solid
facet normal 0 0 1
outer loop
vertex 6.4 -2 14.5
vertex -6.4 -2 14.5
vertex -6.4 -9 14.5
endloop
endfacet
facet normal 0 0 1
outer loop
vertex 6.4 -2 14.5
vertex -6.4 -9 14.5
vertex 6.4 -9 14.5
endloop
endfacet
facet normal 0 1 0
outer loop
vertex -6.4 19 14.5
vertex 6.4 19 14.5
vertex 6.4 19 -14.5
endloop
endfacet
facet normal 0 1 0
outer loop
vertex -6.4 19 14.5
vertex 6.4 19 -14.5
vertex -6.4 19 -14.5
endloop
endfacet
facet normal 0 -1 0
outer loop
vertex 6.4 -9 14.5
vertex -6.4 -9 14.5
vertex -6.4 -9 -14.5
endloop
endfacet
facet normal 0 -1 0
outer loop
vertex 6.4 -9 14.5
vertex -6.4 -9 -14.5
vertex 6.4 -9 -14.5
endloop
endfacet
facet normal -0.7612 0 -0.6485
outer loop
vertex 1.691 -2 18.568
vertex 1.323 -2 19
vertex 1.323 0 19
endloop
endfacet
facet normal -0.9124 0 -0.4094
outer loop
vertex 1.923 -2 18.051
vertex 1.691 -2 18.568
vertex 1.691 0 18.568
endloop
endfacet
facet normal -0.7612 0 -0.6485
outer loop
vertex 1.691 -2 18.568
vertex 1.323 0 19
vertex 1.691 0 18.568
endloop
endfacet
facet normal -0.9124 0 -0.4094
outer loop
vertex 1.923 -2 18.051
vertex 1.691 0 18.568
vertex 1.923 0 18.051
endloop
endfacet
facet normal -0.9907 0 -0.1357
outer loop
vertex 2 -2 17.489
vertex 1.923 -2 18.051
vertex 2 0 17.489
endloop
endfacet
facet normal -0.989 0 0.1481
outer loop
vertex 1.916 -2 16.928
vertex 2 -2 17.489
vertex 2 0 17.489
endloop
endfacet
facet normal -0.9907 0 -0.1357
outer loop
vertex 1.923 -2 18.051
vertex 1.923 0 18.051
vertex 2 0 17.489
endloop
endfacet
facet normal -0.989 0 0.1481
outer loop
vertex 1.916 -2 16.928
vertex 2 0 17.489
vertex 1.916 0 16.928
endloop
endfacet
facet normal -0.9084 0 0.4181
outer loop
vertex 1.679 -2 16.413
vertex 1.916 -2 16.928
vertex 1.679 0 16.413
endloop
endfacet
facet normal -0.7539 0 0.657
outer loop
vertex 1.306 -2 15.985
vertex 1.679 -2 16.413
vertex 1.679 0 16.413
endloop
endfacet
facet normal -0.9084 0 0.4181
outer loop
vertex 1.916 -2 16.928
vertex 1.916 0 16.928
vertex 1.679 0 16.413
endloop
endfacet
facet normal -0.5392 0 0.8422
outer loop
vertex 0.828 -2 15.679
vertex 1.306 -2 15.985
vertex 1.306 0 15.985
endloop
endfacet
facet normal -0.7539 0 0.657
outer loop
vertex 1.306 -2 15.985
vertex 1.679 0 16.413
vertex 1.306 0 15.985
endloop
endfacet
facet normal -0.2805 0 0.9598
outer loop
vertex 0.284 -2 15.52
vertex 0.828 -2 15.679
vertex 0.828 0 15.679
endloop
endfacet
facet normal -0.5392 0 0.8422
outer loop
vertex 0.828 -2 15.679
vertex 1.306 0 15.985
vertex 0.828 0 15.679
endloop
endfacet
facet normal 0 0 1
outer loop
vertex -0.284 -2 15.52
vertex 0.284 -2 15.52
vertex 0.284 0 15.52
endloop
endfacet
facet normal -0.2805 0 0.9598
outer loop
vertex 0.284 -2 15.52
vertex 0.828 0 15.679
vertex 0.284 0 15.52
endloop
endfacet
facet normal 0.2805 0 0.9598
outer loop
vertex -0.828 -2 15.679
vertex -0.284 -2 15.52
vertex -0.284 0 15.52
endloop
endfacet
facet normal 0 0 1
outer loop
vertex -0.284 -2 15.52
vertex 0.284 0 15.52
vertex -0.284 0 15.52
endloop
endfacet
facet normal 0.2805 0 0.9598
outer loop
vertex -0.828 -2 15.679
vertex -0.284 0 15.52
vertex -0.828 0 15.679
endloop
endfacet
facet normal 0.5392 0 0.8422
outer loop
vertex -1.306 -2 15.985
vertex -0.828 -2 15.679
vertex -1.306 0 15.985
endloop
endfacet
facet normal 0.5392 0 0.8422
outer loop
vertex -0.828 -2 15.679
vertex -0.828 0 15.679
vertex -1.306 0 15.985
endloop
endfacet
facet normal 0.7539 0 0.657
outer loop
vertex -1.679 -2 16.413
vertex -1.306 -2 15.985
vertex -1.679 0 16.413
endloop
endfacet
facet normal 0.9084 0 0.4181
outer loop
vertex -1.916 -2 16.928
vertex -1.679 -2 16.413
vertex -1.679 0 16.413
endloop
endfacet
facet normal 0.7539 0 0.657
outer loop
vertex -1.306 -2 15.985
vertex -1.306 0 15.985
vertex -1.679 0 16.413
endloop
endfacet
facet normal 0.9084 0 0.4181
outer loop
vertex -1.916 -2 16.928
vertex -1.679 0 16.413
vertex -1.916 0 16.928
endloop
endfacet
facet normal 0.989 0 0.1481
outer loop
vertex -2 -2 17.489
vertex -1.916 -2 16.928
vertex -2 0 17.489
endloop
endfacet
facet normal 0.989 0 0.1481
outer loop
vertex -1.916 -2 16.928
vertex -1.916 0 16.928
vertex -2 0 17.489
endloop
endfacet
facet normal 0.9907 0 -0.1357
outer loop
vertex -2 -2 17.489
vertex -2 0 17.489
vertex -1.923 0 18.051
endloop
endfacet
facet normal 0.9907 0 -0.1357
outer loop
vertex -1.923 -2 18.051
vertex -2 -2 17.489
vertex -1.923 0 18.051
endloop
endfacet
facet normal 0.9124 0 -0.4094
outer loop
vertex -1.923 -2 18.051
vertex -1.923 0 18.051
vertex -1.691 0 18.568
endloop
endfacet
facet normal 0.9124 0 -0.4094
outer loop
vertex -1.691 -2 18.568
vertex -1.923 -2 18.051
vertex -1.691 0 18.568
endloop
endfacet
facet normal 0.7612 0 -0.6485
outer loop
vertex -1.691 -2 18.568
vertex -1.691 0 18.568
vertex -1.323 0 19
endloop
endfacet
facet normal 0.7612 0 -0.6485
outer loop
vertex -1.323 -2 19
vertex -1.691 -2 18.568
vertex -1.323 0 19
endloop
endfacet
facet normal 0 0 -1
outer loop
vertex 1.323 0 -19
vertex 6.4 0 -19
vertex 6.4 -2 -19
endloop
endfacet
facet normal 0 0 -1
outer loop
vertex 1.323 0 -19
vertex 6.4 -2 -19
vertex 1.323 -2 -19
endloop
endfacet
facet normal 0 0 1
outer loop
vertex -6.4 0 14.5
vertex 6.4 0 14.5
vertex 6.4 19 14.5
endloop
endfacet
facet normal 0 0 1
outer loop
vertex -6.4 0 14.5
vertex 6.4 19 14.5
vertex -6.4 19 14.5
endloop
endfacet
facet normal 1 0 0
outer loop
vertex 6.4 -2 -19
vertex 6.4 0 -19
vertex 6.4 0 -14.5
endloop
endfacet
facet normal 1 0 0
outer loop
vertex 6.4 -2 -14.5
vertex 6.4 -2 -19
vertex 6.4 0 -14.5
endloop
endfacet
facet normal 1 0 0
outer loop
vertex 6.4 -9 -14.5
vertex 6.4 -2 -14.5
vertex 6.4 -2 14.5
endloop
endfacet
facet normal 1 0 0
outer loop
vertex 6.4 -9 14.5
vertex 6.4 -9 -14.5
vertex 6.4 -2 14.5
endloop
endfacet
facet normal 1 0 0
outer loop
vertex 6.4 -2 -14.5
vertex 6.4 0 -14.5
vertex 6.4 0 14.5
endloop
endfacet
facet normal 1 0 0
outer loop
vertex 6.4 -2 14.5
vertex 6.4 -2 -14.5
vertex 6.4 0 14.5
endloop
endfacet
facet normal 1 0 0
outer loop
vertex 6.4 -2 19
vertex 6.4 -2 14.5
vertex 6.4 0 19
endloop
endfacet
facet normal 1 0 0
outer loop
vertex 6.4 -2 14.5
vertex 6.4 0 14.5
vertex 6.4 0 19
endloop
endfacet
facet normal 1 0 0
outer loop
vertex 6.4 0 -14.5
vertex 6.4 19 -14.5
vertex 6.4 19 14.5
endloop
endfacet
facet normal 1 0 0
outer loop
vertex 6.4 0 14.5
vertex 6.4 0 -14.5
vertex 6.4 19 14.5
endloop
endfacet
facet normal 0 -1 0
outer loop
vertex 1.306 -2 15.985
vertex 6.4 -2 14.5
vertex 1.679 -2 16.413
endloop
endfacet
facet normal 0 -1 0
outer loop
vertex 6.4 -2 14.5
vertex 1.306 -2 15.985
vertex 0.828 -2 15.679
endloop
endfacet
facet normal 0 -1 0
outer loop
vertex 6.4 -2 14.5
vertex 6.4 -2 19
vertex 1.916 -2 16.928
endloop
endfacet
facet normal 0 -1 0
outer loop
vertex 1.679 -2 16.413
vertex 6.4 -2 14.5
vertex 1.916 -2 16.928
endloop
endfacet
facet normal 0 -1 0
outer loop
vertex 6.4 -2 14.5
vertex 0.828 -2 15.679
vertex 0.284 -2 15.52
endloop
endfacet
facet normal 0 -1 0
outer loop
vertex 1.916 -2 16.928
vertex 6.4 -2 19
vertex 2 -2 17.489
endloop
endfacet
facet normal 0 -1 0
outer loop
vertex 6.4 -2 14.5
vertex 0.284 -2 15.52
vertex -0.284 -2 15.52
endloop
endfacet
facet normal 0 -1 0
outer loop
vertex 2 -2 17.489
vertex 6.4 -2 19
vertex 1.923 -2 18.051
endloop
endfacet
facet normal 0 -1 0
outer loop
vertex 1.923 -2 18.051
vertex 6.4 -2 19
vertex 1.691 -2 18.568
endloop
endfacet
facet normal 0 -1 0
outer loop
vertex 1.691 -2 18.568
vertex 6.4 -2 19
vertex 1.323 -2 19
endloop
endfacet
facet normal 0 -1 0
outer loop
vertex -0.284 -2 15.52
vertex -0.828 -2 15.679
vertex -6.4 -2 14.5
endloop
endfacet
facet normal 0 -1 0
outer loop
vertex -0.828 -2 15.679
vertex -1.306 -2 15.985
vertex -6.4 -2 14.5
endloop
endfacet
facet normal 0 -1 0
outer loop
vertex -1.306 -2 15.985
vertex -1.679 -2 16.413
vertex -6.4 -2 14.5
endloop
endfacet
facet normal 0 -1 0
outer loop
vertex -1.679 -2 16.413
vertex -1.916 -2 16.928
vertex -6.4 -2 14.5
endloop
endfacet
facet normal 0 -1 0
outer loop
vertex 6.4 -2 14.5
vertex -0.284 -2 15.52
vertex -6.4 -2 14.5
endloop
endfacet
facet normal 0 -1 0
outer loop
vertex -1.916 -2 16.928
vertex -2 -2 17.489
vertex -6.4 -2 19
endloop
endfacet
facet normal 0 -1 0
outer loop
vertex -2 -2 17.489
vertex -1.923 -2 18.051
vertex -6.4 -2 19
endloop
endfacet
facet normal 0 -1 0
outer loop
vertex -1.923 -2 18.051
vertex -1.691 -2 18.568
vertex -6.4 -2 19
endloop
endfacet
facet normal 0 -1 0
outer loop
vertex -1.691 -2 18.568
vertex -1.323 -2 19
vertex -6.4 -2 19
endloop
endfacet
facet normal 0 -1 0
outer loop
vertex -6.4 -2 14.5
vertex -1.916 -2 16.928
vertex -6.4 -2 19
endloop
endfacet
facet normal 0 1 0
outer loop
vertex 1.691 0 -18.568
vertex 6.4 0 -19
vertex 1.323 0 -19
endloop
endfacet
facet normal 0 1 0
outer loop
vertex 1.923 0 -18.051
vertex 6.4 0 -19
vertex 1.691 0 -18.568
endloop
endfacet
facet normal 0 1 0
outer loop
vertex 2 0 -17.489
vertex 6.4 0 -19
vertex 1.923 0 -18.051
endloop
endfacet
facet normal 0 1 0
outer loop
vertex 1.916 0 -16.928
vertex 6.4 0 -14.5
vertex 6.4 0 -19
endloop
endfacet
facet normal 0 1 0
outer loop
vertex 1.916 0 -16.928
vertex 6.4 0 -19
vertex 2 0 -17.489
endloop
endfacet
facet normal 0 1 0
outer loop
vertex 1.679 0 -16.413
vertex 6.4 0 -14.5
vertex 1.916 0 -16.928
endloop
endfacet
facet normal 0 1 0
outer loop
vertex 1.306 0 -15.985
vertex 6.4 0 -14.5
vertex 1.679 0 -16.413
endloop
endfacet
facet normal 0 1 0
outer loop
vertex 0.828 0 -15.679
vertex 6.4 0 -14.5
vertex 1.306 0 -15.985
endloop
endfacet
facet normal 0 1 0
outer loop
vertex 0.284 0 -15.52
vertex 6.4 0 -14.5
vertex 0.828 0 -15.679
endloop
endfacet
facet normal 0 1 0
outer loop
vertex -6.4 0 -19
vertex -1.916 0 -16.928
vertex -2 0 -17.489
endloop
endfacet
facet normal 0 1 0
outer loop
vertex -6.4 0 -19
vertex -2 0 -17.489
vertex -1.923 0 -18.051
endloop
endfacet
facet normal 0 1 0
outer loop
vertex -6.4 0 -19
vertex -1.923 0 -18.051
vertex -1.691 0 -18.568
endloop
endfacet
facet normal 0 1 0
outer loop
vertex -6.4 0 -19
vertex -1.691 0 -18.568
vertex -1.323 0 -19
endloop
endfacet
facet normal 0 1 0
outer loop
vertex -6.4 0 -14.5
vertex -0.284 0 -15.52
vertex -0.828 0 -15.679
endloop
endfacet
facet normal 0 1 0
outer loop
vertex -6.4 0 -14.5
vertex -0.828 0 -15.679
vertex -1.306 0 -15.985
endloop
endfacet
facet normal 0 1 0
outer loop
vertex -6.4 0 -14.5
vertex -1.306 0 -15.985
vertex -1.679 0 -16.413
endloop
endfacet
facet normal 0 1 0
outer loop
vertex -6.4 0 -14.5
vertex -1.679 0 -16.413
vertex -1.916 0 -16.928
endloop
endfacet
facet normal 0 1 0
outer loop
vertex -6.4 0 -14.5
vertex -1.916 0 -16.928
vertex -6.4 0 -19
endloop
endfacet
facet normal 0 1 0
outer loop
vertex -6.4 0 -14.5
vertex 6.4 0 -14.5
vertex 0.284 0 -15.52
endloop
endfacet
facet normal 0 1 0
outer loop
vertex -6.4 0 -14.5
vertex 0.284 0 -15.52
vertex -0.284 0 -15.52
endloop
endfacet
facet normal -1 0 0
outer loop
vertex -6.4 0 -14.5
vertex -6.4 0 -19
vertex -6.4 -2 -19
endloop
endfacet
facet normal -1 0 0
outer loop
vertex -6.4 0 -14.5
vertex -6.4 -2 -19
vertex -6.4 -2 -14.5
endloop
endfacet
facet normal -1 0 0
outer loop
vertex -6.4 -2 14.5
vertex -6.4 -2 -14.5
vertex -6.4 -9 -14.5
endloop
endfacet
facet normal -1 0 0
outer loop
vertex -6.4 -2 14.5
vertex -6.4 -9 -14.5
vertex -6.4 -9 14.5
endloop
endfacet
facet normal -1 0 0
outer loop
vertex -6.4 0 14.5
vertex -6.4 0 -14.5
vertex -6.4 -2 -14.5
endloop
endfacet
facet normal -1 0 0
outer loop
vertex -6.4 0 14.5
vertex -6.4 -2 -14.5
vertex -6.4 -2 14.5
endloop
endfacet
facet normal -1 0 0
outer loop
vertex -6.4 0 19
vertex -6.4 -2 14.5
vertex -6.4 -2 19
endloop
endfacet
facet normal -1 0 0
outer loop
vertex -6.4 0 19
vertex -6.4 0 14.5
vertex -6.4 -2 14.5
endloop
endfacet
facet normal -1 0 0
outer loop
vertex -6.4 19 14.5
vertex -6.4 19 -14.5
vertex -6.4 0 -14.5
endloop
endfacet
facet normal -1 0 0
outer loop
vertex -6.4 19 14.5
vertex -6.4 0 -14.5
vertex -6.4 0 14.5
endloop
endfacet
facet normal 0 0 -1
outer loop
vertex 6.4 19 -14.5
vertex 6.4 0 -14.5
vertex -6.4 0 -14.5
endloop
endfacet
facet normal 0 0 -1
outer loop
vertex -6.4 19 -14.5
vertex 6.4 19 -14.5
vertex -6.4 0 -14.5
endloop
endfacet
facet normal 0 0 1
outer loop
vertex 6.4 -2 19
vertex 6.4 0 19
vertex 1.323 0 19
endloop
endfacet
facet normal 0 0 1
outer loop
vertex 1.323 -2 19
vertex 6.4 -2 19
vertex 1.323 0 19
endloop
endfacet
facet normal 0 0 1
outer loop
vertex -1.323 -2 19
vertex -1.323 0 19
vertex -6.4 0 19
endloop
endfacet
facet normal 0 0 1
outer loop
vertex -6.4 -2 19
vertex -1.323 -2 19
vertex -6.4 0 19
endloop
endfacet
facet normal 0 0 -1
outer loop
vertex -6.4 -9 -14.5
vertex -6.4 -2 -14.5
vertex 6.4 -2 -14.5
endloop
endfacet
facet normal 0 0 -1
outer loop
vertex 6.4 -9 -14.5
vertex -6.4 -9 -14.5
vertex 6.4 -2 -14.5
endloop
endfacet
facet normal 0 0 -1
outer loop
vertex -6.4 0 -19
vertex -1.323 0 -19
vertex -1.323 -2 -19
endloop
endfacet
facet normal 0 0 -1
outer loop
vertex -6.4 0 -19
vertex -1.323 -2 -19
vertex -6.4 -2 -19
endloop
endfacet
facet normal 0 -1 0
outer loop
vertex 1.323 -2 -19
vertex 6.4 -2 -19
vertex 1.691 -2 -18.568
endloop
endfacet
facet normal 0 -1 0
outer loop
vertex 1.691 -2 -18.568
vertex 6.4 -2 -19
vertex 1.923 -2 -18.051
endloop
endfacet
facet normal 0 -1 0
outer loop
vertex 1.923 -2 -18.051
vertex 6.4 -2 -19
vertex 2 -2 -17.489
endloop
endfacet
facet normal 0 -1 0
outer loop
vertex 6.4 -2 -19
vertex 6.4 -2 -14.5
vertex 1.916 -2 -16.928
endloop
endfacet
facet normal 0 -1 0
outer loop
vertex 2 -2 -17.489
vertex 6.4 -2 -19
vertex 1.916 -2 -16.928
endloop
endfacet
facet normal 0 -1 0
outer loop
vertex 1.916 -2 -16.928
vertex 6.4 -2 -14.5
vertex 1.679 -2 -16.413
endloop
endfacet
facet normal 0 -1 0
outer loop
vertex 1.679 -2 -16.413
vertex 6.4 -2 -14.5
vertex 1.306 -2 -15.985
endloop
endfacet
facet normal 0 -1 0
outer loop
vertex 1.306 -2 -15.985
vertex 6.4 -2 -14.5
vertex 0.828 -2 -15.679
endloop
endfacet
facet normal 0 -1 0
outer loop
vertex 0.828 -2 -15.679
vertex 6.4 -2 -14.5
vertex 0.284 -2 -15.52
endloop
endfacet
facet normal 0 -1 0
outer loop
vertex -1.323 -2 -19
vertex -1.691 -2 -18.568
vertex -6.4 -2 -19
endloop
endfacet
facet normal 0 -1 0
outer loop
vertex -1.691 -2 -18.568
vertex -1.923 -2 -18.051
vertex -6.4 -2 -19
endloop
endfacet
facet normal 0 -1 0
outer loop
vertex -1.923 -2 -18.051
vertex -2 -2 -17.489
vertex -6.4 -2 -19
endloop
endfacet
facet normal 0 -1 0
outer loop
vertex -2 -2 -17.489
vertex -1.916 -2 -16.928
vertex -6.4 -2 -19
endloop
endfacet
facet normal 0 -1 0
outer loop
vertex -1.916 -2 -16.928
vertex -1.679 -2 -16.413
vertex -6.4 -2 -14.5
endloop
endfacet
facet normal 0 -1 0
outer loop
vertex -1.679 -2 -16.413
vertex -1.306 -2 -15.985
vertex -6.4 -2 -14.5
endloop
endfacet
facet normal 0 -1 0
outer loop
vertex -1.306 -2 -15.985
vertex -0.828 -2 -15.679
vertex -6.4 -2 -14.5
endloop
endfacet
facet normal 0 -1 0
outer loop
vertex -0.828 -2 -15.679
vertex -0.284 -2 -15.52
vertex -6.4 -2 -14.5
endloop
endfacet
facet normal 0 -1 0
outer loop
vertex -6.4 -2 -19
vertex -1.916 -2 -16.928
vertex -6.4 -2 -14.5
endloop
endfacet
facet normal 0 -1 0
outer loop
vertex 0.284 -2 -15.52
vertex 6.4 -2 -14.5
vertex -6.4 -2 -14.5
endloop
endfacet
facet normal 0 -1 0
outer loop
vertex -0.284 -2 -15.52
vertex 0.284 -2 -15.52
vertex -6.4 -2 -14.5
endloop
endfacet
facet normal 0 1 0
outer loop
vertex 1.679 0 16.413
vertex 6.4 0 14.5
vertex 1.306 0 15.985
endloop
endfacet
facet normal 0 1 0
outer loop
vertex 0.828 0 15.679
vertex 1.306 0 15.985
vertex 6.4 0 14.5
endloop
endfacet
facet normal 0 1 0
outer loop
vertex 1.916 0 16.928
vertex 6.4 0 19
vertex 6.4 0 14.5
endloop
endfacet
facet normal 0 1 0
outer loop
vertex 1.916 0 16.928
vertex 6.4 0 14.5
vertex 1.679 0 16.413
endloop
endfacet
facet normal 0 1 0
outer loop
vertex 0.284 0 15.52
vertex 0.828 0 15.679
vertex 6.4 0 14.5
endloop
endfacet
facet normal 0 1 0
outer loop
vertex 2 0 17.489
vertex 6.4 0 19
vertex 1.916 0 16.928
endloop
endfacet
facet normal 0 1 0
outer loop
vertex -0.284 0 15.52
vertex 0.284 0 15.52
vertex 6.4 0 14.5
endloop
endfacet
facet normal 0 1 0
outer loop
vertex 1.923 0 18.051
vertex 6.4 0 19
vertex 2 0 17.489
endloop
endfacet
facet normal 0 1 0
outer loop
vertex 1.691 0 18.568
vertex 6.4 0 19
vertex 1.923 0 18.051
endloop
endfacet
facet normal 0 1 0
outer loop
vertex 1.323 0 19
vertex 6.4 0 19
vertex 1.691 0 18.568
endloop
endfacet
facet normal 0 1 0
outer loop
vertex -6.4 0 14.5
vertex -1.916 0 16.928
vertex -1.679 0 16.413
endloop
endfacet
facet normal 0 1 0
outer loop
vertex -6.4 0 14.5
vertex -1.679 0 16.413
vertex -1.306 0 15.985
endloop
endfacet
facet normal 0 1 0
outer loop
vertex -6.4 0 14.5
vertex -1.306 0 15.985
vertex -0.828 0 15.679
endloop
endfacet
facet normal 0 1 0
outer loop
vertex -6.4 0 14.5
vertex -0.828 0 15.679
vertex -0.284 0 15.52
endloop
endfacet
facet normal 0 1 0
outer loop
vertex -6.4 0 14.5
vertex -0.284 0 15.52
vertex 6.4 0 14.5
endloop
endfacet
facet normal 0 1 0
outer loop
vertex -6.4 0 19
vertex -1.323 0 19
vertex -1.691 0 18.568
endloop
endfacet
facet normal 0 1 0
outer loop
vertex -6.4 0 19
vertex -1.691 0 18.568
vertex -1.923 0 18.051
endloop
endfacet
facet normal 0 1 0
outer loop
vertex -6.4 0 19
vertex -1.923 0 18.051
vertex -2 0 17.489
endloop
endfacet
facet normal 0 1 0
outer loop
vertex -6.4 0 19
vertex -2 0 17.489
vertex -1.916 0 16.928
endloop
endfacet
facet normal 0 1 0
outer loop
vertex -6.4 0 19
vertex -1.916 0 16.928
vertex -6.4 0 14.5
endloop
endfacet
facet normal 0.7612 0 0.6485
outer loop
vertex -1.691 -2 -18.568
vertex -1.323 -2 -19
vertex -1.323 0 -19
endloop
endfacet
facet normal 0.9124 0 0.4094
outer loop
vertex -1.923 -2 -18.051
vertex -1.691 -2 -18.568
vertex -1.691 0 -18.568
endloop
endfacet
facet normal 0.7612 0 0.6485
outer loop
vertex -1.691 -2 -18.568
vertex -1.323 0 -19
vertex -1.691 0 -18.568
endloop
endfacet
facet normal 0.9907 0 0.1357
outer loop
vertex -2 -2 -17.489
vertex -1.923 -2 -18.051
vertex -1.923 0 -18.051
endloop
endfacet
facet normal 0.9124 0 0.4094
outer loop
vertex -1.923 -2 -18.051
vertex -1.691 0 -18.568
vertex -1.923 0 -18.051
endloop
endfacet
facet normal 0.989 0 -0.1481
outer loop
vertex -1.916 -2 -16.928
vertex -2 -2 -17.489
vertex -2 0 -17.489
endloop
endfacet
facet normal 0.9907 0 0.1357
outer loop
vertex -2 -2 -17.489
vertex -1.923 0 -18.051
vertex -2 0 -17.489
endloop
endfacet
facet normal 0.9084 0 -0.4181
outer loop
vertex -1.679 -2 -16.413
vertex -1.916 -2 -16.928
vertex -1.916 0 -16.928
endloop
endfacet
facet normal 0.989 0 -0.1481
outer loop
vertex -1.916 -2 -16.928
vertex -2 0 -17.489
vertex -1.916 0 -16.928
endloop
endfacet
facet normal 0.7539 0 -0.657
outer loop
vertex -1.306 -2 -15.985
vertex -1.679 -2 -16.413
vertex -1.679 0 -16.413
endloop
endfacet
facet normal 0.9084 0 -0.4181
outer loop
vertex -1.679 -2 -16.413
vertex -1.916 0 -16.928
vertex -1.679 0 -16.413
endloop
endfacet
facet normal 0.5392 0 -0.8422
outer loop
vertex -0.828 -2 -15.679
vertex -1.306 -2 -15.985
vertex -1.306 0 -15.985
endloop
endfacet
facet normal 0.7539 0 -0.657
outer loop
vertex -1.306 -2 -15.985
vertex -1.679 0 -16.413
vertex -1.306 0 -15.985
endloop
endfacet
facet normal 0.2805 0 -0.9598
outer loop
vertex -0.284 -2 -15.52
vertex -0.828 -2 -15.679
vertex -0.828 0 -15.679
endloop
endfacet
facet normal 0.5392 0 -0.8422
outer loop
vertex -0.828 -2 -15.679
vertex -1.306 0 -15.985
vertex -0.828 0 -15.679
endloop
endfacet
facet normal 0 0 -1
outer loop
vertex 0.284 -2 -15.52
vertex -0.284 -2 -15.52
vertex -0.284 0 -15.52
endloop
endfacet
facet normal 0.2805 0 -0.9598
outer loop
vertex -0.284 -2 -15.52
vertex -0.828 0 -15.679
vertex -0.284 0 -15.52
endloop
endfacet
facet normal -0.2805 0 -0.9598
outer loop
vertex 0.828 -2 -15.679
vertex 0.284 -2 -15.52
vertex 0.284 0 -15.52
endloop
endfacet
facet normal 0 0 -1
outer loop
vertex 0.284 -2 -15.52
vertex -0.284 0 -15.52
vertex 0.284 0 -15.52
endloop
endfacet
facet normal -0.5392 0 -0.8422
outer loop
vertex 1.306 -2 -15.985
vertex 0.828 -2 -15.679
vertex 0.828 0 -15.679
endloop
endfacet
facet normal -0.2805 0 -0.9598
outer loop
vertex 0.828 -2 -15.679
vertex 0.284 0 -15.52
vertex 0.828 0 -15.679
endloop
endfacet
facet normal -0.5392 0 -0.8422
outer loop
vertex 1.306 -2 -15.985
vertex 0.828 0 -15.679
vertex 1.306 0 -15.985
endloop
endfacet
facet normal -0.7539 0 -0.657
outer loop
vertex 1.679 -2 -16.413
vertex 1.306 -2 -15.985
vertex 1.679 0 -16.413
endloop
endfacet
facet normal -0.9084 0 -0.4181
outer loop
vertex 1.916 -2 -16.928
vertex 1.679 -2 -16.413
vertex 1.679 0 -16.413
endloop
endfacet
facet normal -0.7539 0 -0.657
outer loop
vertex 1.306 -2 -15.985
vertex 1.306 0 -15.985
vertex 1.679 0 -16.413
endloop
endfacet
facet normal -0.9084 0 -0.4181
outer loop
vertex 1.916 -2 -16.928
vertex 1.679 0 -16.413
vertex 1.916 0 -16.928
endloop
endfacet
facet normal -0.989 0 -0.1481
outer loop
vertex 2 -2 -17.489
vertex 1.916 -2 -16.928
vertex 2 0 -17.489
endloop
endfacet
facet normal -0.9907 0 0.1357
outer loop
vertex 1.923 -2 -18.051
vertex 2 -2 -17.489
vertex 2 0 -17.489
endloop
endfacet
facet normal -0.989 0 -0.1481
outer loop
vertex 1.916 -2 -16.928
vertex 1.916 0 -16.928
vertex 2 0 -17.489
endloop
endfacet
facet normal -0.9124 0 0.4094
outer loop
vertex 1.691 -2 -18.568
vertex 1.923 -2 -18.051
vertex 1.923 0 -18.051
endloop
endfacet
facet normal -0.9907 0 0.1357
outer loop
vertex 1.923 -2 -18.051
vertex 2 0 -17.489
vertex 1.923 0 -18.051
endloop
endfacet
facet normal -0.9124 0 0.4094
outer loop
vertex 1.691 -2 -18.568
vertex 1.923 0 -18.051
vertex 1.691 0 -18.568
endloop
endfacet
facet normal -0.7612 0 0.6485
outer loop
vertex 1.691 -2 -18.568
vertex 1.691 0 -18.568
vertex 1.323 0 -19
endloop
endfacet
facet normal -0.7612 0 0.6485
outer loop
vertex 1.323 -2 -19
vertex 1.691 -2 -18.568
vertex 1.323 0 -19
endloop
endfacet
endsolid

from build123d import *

# Parameters (mm, degrees)
F0_W     = 12.8
F0_H     = 29
F1_DEPTH = 9
F2_W     = 12.8
F2_H     = 38
F3_DEPTH = 2
F4_W     = 12.8
F4_H     = 29
F5_DEPTH = 19
F7_D     = 4


with BuildPart() as f1:
    # F0 (on Front) → F1 (new body)
    with BuildSketch(Plane.XZ):
        Rectangle(F0_W, F0_H)
    extrude(amount=F1_DEPTH)

    # F2 (on face) → F3 (join)
    with BuildSketch(Plane(origin=(0, 0, 0), x_dir=(-1, 0, 0), z_dir=(0, 1, 0))):
        Rectangle(F2_W, F2_H)
    extrude(amount=-F3_DEPTH)

    # F4 (on face) → F5 (join)
    with BuildSketch(Plane(origin=(0, 0, 0), x_dir=(-1, 0, 0), z_dir=(0, 1, 0))):
        Rectangle(F4_W, F4_H)
    extrude(amount=F5_DEPTH)

    # F7 (through all)
    with Locations(Plane.XZ.offset(2)):
        with Locations((0, -17.5), (0, 17.5)):
            Hole(F7_D / 2)


solid = f1.part
